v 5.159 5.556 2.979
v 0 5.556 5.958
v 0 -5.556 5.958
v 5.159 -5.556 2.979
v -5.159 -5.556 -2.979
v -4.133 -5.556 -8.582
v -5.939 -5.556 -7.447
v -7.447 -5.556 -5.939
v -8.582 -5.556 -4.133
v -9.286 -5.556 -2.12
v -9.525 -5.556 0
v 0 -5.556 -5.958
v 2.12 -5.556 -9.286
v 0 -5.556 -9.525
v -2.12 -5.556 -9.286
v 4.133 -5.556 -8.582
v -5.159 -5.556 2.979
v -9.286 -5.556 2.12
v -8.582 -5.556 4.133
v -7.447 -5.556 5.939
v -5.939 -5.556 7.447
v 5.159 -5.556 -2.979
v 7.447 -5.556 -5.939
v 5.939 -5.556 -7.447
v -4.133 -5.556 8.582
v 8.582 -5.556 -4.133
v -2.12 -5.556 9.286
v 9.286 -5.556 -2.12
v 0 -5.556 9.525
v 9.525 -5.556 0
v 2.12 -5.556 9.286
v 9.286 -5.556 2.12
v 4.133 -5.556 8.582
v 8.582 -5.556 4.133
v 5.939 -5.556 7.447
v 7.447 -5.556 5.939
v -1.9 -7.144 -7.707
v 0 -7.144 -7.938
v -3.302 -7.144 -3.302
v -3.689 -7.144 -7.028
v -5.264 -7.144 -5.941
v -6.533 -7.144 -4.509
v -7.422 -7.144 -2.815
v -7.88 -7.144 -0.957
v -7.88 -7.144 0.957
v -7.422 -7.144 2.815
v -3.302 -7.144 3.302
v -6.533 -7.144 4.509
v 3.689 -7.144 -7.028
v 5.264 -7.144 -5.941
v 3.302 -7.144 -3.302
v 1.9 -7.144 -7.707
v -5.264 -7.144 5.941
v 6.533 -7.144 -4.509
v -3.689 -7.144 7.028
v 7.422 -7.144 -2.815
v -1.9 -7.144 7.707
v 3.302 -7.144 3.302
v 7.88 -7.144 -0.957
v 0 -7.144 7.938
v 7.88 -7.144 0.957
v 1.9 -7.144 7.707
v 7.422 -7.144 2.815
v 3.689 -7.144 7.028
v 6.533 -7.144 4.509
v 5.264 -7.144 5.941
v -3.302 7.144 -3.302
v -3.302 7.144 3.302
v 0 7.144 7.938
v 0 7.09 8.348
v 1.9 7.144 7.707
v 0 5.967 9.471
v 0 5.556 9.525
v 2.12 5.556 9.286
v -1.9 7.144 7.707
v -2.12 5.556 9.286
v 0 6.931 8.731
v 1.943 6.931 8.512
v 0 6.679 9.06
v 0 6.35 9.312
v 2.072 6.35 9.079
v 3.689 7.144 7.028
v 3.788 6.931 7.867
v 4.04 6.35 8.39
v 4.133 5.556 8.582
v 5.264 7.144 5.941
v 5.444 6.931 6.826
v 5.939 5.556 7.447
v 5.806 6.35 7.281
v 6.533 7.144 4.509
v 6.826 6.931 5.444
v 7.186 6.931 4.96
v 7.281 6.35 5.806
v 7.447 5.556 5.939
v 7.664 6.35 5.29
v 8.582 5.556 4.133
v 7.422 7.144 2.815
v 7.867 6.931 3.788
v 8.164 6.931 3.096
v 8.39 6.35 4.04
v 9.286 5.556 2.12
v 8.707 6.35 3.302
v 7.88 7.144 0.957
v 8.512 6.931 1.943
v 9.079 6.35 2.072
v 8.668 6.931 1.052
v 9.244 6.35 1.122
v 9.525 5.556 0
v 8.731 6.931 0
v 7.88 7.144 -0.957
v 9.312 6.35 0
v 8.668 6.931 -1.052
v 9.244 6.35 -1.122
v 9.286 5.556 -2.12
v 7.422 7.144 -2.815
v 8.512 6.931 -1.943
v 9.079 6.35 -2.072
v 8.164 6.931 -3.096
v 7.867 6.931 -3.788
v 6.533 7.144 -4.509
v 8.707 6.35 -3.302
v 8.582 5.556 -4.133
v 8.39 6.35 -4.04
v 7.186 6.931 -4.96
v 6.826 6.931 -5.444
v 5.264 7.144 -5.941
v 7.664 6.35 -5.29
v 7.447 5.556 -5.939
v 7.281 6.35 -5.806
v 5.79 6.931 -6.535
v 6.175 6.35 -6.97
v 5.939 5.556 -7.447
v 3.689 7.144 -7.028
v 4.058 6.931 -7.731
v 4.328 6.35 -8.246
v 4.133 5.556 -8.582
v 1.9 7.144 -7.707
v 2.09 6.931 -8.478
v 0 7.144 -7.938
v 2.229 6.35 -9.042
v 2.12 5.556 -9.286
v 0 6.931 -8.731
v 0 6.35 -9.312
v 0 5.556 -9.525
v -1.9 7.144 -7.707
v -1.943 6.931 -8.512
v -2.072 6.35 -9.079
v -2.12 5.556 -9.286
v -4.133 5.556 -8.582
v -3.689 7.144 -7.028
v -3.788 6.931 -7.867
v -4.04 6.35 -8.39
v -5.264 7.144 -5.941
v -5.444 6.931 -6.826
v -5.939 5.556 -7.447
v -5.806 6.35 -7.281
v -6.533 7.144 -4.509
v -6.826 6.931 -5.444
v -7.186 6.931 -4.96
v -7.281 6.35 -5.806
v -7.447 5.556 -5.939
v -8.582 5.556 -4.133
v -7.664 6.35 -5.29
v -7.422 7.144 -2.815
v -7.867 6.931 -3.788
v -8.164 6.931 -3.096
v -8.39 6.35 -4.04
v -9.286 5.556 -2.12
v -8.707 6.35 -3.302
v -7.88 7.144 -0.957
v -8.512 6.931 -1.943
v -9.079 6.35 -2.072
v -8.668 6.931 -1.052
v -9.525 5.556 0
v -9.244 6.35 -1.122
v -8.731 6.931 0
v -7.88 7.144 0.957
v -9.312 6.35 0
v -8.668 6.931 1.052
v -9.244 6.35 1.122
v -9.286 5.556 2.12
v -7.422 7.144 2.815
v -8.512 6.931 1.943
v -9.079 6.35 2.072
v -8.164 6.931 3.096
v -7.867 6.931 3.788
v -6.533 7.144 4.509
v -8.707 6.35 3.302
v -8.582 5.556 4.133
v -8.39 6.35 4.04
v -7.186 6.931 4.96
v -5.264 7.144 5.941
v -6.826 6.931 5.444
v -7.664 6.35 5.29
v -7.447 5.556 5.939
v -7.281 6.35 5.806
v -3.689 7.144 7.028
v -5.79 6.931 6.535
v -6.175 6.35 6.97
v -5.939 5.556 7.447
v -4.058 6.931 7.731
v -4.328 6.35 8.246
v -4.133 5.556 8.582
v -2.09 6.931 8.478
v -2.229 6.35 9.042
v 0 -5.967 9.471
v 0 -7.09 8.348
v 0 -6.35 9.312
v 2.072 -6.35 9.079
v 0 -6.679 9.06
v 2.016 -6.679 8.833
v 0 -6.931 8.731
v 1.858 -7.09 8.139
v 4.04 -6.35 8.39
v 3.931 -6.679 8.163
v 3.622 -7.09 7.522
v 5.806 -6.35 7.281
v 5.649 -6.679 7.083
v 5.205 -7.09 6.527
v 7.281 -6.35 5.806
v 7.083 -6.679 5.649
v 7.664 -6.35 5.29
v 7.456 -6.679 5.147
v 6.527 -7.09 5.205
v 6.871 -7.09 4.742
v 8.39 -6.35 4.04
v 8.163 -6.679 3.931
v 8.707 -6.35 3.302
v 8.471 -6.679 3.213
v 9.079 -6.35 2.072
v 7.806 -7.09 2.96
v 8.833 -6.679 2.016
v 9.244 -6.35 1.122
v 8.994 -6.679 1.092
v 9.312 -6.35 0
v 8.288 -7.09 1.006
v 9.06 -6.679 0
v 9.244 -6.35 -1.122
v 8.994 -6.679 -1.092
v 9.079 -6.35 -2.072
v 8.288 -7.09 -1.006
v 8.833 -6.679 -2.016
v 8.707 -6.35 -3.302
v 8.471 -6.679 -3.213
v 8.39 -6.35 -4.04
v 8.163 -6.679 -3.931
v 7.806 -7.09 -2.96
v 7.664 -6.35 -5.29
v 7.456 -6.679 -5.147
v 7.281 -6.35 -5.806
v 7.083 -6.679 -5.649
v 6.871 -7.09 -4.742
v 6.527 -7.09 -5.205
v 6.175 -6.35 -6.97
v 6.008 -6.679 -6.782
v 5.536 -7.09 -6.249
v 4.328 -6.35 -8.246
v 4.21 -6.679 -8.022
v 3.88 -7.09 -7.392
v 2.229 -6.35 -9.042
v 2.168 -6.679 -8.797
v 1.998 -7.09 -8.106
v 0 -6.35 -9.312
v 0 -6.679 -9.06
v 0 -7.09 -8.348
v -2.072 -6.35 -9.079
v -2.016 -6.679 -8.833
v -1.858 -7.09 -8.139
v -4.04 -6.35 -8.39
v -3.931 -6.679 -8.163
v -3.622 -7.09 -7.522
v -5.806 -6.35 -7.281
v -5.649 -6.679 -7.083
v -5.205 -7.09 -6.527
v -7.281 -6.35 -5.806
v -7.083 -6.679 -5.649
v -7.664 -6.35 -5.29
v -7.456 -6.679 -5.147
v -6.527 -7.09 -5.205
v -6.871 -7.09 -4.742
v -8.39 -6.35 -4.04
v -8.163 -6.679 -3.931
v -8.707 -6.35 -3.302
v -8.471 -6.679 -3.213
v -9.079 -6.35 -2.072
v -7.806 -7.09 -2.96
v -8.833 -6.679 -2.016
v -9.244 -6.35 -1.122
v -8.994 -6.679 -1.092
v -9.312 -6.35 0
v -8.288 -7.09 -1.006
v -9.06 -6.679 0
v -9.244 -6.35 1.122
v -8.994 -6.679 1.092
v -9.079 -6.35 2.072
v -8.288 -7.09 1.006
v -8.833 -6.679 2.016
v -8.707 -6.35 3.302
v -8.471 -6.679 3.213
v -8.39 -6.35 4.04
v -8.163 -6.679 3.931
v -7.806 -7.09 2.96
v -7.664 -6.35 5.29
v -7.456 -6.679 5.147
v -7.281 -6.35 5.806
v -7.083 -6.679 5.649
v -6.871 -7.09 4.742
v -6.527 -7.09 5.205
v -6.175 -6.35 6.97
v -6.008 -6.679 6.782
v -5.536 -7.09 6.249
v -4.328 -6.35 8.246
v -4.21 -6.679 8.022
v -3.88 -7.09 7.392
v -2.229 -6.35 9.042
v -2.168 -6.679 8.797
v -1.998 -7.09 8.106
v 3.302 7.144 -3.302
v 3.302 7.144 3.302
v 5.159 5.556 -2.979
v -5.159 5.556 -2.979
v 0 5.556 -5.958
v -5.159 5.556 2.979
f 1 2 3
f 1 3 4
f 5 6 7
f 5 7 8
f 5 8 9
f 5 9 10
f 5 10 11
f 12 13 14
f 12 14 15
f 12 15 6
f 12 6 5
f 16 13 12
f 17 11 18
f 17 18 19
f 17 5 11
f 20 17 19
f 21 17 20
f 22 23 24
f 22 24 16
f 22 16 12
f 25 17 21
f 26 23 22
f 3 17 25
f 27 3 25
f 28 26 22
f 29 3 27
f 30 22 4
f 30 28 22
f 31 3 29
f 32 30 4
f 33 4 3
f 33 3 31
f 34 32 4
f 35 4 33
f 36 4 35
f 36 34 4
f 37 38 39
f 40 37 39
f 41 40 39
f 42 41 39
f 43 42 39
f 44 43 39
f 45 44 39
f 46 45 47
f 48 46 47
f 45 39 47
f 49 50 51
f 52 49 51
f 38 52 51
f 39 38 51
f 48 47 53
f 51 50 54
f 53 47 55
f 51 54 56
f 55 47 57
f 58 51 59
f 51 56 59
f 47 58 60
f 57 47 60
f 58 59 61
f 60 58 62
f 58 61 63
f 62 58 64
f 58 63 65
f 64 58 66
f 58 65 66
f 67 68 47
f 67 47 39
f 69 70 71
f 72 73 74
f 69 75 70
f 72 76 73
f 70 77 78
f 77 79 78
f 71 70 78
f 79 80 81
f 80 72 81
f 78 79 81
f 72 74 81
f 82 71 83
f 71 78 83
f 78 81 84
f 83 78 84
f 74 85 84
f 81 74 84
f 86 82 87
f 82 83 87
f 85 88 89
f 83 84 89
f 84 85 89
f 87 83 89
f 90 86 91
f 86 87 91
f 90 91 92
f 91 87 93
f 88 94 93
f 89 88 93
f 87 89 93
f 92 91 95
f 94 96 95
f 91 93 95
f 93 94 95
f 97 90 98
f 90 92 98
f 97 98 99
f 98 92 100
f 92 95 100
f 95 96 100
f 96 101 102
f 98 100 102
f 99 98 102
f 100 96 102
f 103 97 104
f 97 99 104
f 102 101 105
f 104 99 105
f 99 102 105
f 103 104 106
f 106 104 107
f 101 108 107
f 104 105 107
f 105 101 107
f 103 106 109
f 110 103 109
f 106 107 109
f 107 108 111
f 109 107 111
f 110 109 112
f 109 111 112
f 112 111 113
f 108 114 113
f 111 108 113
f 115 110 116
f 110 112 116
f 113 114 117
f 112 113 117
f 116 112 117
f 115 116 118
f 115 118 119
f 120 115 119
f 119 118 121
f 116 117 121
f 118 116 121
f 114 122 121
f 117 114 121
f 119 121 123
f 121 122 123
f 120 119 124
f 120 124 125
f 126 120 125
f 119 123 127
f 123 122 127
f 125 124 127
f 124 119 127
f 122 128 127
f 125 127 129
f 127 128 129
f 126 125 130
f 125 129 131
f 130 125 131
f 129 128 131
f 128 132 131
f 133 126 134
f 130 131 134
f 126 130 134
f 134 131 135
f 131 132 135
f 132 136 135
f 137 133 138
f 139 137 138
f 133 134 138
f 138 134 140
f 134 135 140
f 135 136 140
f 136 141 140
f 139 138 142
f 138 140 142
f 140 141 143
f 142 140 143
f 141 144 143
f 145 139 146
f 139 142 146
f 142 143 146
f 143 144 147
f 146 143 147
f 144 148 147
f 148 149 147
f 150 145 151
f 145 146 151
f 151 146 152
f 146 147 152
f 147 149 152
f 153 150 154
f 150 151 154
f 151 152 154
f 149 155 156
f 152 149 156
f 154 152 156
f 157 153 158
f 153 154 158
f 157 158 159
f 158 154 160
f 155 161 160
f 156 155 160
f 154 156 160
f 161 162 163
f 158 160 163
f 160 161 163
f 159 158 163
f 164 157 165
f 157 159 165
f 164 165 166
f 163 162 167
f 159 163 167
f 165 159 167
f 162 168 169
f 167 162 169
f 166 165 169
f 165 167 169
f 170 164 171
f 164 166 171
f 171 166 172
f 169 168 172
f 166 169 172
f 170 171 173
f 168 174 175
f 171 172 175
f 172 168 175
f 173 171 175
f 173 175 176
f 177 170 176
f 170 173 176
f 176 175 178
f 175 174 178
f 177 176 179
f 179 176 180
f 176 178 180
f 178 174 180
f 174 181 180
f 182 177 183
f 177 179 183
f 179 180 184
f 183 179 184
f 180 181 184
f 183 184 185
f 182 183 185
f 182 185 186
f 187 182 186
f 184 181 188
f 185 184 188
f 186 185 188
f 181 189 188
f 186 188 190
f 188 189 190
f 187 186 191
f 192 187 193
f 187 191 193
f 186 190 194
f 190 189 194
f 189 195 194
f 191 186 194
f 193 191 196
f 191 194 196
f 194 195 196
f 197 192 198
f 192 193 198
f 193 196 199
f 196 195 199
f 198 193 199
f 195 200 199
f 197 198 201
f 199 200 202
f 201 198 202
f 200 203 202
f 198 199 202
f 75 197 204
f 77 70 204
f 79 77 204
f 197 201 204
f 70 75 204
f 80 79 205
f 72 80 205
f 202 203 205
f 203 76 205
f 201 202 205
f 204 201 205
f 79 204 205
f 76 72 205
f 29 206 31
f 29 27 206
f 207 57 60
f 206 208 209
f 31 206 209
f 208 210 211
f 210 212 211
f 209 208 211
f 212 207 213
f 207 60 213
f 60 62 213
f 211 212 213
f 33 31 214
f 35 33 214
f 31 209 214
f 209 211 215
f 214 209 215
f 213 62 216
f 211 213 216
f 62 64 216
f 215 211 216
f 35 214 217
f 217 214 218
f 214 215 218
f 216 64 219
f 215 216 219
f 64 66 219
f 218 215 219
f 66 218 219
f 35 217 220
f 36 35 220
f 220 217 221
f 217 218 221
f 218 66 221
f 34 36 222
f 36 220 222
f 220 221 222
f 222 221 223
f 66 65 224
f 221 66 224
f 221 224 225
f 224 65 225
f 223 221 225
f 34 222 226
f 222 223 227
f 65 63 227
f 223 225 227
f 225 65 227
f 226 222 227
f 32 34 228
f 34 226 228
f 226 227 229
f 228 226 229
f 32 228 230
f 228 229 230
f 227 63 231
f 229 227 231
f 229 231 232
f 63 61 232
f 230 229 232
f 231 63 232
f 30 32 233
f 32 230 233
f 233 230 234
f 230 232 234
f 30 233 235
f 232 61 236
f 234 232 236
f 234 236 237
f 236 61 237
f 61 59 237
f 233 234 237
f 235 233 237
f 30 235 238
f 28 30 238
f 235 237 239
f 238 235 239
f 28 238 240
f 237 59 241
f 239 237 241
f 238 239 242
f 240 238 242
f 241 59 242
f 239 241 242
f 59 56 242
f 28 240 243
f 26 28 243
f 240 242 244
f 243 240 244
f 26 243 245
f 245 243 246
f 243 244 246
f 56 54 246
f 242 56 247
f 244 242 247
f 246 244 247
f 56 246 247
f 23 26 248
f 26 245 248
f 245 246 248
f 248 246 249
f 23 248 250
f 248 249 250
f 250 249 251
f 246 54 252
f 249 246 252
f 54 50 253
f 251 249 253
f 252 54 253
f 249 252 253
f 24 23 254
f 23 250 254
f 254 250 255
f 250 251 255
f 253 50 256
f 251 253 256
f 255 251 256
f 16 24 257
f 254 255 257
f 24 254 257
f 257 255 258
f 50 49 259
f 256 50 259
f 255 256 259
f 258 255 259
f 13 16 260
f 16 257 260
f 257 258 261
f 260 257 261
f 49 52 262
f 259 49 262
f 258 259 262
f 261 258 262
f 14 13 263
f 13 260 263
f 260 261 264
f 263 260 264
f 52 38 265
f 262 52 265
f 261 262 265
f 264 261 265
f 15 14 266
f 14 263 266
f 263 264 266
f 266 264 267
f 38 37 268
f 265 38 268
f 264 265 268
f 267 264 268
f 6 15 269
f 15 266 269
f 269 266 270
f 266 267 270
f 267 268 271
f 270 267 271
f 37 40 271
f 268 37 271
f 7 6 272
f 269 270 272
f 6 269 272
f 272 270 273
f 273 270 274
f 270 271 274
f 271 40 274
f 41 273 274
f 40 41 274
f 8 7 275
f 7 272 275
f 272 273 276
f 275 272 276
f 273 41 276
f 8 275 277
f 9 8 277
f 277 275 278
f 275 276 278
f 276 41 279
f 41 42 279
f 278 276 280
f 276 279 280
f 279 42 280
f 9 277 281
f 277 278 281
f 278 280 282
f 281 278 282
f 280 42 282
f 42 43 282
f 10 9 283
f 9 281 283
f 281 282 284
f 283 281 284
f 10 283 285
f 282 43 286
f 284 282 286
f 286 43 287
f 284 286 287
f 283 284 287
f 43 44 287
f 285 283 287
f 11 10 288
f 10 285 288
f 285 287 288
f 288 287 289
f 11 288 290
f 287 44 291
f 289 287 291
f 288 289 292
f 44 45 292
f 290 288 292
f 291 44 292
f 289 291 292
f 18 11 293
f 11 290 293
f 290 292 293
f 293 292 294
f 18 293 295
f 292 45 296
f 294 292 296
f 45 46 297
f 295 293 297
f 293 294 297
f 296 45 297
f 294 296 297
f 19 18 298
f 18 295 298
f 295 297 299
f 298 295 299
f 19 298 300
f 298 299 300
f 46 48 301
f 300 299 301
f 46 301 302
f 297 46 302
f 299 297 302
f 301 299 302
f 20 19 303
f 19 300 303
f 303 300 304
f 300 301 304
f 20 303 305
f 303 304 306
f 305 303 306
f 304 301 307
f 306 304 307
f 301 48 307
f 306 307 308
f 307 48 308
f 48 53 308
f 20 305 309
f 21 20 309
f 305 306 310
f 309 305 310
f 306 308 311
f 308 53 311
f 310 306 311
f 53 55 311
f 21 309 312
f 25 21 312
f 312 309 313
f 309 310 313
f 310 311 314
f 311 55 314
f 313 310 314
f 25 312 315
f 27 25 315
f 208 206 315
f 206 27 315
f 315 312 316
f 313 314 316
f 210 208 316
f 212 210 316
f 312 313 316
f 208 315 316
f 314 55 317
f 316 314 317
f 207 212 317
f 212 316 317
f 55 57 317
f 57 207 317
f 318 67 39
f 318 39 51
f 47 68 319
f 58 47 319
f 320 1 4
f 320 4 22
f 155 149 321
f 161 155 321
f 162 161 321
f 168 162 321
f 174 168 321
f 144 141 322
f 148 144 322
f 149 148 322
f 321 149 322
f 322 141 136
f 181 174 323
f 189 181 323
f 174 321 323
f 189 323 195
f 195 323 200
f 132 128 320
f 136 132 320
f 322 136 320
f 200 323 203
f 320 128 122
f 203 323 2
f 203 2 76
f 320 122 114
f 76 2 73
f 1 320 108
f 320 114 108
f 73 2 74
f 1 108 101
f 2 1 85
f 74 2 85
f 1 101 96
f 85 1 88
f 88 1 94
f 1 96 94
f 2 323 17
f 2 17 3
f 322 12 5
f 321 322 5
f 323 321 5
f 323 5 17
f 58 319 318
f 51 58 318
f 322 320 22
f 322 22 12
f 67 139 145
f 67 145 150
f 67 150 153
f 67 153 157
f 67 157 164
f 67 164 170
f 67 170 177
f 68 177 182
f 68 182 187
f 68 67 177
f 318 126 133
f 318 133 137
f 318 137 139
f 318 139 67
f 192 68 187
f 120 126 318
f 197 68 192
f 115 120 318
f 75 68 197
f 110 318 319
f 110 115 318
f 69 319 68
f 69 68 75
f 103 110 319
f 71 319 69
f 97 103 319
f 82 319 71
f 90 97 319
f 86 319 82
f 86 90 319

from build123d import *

# Parameters (mm, degrees)
BOSS_EXTRUDE1_DEPTH = 6.35
SKETCH2_R           = 9.525
BOSS_EXTRUDE2_DEPTH = 0.79375
SKETCH3_W           = 6.604
SKETCH3_H           = 6.604
CUT_EXTRUDE1_DEPTH  = 20.636290542
FILLET1_R           = 1.5875


with BuildPart() as part:
    # Sketch1 → Boss-Extrude1 (new, symmetric)
    with BuildSketch(Plane(origin=(0, 0, 0), x_dir=(1, 0, 0), z_dir=(0, 1, 0))):
        Polygon((0, 5.95753309), (-5.159375, 2.978766545), (-5.159375, -2.978766545), (0, -5.95753309), (5.159375, -2.978766545), (5.159375, 2.978766545), align=None)
    extrude(amount=BOSS_EXTRUDE1_DEPTH, both=True)

    # Sketch2 → Boss-Extrude2 (add, symmetric)
    with BuildSketch(Plane(origin=(0, 6.35, 0), x_dir=(1, 0, 0), z_dir=(0, 1, 0))):
        with Locations(Location((0, 0, 0), (0, 0, 270))):
            Circle(SKETCH2_R)
    boss_extrude2 = extrude(amount=BOSS_EXTRUDE2_DEPTH, both=True)

    # Mirror1: Boss-Extrude2 across plane
    add(boss_extrude2.mirror(Plane.ZX))

    # Sketch3 → Cut-Extrude1 (cut, through all)
    with BuildSketch(Plane(origin=(0, 7.14375, 0), x_dir=(1, 0, 0), z_dir=(0, 1, 0))):
        Rectangle(SKETCH3_W, SKETCH3_H)
    extrude(amount=-CUT_EXTRUDE1_DEPTH, mode=Mode.SUBTRACT)

    # Fillet1
    fillet1_edges = [part.edges().sort_by_distance(p)[0] for p in [
        (0, 7.14375, -9.525),
        (0, -7.14375, -9.525),
    ]]
    fillet(fillet1_edges, radius=FILLET1_R - 0.0001)  # a hair under: the kernel refuses the full size


solid = part.part
